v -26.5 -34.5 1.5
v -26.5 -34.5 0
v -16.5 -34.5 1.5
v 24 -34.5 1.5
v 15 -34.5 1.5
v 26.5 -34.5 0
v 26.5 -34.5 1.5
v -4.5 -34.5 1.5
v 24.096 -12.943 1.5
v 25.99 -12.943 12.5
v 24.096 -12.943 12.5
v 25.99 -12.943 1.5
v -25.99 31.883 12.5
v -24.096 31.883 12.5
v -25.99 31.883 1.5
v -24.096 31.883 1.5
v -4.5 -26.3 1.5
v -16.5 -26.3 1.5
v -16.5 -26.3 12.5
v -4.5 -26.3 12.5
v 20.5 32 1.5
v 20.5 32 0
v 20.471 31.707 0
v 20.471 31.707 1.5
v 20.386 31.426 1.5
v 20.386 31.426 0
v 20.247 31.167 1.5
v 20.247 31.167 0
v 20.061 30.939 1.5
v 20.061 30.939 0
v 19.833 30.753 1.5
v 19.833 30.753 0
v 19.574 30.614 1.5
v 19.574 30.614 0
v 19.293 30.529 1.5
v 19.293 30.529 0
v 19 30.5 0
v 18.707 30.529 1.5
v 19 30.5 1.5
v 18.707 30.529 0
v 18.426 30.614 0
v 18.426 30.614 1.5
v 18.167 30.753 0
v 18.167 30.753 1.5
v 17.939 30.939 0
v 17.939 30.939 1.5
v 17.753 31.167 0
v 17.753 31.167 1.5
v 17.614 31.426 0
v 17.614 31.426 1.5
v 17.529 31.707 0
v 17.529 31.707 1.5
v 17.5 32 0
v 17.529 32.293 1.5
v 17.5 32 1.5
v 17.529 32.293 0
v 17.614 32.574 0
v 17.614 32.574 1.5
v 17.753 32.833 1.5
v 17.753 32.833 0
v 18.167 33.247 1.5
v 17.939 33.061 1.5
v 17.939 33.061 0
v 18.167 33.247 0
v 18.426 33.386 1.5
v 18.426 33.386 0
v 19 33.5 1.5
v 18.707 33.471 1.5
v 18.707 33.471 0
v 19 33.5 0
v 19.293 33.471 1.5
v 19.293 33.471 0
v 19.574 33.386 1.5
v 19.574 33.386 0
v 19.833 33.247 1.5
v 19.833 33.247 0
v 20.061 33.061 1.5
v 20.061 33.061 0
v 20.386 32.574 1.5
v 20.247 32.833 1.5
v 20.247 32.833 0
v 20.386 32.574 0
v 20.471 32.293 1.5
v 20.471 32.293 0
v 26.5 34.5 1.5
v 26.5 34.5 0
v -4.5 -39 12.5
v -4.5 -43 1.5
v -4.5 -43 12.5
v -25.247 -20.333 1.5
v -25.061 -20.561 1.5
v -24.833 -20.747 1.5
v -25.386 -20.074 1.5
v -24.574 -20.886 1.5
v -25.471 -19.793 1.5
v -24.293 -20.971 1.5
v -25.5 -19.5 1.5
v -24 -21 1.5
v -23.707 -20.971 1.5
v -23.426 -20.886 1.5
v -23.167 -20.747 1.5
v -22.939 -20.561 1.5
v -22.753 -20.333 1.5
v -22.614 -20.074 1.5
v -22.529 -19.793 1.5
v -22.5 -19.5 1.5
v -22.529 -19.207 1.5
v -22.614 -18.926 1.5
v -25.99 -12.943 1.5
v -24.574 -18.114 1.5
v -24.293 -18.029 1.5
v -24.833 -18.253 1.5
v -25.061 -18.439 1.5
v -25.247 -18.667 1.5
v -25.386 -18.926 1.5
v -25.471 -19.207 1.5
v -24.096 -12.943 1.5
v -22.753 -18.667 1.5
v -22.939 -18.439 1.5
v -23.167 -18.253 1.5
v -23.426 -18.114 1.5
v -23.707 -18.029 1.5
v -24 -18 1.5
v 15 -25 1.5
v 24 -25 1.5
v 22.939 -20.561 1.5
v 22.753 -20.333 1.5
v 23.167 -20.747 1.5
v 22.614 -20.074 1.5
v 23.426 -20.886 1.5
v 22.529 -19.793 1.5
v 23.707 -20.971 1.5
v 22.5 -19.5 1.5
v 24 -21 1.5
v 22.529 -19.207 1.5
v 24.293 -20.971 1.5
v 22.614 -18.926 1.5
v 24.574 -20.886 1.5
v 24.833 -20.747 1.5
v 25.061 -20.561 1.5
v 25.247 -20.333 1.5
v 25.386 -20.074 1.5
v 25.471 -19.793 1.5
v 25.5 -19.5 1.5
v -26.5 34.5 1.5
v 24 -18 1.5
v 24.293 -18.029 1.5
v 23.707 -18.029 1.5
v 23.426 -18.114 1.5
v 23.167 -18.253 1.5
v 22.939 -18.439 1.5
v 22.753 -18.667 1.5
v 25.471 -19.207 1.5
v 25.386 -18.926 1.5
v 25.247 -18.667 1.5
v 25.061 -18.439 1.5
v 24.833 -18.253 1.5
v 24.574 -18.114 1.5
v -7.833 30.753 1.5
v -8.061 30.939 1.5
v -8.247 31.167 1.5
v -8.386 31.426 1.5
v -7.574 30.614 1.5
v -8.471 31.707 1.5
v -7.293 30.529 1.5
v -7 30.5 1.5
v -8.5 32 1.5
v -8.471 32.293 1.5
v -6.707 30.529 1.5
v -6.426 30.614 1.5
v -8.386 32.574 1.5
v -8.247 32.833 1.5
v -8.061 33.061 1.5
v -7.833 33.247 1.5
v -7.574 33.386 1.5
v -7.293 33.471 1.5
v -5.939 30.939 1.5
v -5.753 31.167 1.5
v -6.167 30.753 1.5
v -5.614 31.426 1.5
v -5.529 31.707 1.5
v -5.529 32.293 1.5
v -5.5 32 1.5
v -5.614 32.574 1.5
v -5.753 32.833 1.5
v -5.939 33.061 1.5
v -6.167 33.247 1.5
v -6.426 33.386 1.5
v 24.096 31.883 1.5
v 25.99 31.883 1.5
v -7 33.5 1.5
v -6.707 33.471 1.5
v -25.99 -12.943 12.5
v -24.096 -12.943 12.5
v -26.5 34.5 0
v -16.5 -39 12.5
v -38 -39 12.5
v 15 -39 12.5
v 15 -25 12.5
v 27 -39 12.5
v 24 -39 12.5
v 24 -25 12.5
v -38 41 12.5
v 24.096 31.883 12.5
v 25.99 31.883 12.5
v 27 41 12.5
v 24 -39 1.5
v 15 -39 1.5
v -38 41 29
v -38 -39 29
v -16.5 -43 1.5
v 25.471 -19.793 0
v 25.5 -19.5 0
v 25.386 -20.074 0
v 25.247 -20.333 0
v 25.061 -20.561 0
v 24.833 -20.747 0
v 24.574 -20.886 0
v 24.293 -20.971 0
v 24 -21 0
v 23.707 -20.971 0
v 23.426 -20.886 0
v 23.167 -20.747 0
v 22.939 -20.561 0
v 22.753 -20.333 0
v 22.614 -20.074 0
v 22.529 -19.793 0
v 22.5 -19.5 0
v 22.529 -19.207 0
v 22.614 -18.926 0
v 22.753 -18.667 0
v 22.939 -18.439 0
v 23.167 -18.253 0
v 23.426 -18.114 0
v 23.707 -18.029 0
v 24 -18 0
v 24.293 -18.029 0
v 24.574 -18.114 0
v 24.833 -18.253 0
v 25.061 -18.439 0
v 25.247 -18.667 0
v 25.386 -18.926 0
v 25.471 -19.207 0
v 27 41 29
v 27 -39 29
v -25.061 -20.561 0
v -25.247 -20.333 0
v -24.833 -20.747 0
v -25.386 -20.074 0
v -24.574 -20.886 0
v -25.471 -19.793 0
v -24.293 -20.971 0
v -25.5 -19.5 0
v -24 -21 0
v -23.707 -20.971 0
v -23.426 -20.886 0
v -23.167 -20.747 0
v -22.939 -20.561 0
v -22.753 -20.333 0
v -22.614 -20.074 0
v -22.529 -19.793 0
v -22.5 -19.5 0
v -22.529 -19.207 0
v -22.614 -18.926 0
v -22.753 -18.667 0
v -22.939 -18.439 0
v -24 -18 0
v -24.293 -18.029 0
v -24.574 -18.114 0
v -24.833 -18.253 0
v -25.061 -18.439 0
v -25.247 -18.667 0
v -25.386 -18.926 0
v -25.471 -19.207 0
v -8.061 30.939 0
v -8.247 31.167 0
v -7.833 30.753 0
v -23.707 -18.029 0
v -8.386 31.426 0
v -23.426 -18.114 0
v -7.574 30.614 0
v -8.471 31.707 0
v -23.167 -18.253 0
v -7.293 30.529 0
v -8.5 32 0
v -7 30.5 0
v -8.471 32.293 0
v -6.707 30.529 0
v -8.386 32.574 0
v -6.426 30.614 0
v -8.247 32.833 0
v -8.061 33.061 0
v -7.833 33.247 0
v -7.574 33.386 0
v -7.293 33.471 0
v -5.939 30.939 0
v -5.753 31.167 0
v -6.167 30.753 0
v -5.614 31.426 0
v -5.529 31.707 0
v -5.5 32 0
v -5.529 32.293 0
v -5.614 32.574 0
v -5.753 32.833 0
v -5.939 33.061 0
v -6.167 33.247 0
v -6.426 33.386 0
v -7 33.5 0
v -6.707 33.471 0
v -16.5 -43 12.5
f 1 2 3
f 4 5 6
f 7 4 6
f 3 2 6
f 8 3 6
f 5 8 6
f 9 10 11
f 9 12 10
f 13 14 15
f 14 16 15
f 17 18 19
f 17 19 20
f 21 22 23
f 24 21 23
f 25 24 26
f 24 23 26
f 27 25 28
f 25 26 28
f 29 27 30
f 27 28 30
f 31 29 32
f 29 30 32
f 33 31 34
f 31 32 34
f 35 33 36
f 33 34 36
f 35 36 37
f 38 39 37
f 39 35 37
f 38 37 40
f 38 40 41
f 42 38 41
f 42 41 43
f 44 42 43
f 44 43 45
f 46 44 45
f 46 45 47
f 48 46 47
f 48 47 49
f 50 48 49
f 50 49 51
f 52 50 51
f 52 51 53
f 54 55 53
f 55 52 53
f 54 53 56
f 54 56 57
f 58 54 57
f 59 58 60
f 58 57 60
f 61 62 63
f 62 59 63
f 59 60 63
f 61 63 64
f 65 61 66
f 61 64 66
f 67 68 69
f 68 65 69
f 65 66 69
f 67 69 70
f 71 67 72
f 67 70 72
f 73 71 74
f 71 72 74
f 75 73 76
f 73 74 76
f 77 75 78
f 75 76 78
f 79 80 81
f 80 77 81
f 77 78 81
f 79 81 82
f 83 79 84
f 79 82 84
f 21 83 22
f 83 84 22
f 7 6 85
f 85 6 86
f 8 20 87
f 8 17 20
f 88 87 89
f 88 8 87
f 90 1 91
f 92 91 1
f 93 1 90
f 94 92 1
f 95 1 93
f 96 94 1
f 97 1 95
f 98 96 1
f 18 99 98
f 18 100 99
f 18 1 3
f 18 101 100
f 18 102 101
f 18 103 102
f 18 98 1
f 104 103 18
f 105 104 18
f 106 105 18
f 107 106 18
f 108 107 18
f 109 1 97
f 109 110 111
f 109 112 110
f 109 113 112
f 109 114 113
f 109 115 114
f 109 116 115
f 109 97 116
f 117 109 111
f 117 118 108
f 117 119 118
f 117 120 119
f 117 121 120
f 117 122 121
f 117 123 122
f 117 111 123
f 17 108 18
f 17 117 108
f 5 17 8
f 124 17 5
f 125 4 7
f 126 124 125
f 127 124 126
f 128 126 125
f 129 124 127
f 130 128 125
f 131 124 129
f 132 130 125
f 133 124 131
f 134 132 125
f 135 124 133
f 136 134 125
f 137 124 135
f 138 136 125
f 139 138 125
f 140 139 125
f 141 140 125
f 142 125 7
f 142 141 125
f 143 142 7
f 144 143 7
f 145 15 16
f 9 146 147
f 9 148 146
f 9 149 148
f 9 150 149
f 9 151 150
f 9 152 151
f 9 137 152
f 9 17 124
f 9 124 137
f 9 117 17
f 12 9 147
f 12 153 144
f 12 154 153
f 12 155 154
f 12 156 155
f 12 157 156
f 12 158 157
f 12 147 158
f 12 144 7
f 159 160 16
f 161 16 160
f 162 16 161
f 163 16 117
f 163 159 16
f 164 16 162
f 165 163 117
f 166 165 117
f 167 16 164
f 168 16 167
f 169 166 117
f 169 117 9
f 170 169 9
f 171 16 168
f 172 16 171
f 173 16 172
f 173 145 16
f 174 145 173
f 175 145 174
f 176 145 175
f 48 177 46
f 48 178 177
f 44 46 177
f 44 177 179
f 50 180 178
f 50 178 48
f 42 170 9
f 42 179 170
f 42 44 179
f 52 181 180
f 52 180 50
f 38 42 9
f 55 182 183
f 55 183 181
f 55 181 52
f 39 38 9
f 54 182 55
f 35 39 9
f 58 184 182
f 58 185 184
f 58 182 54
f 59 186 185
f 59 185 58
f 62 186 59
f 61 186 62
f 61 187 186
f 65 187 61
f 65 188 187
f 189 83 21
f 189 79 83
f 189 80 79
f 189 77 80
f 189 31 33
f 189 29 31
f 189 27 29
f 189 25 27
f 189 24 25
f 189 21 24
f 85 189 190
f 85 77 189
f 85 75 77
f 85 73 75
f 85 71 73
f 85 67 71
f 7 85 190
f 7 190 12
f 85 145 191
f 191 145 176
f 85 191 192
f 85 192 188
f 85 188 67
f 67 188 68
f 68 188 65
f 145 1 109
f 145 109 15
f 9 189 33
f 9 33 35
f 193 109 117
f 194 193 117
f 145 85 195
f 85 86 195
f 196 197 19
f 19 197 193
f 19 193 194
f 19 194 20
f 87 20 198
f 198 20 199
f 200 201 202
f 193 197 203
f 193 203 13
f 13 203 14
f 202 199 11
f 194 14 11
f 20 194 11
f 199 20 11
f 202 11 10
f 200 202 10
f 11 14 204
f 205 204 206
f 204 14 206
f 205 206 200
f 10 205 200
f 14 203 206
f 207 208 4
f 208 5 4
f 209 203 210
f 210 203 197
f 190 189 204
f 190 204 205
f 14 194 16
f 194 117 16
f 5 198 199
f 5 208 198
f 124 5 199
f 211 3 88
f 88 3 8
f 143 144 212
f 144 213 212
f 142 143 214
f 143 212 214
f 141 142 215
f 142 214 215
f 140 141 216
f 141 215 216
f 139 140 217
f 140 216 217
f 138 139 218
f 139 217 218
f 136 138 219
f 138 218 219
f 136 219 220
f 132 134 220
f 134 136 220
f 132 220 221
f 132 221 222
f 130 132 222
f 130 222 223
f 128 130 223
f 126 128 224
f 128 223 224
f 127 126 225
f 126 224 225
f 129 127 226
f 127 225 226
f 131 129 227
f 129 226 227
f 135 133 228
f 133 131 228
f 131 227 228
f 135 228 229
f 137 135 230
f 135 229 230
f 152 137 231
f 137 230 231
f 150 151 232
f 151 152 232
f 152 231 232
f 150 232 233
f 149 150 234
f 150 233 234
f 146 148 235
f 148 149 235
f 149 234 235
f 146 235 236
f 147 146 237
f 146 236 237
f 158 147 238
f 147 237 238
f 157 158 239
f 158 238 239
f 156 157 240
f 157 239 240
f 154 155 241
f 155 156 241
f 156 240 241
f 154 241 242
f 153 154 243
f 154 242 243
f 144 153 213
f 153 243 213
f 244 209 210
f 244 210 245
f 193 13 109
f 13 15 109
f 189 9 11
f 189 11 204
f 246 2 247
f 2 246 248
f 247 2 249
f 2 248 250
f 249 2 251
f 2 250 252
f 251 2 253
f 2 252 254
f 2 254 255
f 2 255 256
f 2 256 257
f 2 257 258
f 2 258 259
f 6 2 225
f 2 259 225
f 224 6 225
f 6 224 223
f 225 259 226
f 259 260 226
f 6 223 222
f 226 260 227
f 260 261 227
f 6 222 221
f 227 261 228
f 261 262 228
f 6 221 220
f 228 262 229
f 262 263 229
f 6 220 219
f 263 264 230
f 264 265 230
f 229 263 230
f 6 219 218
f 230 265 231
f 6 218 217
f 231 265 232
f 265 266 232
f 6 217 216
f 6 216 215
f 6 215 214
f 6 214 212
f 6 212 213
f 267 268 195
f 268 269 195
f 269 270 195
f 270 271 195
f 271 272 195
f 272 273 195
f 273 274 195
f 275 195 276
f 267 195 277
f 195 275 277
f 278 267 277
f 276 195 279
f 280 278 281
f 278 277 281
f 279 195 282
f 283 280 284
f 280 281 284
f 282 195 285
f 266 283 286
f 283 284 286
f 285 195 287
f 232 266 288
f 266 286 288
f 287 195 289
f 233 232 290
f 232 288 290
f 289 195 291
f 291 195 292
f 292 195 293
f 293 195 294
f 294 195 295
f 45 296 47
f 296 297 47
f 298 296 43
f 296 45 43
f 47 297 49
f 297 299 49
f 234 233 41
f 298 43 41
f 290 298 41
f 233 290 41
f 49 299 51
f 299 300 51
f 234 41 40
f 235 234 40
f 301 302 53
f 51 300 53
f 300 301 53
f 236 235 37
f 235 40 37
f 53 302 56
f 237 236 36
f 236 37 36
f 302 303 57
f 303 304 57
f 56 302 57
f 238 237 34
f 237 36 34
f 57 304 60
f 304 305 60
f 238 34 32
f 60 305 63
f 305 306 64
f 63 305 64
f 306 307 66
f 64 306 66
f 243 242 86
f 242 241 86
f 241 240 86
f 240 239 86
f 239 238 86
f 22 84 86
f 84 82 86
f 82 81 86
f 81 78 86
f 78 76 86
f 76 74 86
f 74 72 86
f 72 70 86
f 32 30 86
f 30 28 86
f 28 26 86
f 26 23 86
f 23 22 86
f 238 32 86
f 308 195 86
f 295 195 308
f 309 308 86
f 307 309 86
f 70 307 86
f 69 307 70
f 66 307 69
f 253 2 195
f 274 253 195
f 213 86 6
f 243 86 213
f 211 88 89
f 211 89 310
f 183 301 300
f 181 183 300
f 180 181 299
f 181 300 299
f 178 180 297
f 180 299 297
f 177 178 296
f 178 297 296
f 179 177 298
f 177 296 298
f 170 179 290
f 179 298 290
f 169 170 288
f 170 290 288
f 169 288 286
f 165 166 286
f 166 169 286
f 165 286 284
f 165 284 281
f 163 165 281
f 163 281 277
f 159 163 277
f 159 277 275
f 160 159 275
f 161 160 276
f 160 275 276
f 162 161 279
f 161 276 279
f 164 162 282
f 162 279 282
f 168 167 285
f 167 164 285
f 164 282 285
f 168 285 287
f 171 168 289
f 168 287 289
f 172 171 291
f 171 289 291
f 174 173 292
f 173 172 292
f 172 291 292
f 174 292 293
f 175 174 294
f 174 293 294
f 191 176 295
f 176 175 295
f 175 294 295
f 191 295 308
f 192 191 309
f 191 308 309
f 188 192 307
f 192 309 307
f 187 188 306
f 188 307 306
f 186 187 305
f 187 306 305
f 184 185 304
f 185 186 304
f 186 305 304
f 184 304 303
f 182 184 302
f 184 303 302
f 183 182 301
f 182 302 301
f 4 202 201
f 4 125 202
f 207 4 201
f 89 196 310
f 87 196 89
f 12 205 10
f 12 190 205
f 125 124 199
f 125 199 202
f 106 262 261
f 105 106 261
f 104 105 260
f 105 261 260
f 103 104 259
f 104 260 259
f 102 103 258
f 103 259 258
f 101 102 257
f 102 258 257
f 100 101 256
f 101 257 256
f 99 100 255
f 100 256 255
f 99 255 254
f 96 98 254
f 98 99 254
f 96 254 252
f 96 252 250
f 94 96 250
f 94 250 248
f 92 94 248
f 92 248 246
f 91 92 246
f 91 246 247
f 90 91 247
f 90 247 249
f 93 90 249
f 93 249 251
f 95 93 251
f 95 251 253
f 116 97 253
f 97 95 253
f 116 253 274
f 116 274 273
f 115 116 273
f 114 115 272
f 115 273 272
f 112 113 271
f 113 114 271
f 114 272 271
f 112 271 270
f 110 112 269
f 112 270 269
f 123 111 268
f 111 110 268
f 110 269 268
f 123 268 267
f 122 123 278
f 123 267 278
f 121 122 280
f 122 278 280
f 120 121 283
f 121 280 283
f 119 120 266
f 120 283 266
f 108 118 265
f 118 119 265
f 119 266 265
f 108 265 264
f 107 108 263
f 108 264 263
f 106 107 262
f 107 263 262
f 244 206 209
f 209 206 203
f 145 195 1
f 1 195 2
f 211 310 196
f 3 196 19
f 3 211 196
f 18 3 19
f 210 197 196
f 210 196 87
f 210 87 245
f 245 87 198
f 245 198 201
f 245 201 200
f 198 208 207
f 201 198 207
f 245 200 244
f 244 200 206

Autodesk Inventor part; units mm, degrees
ref_plane "YZ Plane" through (0, 0, 0) normal (1, 0, 0) x (0, 1, 0)
ref_plane "XZ Plane" through (0, 0, 0) normal (0, 1, 0) x (-1, 0, 0)
ref_plane "XY Plane" through (0, 0, 0) normal (0, 0, 1) x (1, 0, 0)
sketch "스케치2" plane through (0, 0, 0) normal (0, 0, 1) x (1, 0, 0)
  line L0 (-26.5, -34.5) -> (26.5, -34.5)
  line L1 (26.5, -34.5) -> (26.5, 34.5)
  line L2 (26.5, 34.5) -> (-26.5, 34.5)
  line L3 (-26.5, 34.5) -> (-26.5, -34.5)
  line L4 (-26.5, -34.5) -> (26.5, 34.5) construction
  line L5 (26.5, -34.5) -> (-26.5, 34.5) construction
  circle A0 centre (19, 32) radius 1.5
  circle A1 centre (-7, 32) radius 1.5
  circle A2 centre (24, -19.5) radius 1.5
  circle A3 centre (-24, -19.5) radius 1.5
  point P0 (0, 0)
  dimension "d0" = 53
  dimension "d1" = 69
  dimension "d2" = 3
  dimension "d3" = 3
  dimension "d4" = 2.5
  dimension "d5" = 2.5
  dimension "d6" = 7.5
  dimension "d8" = 26
  dimension "d9" = 3
  dimension "d10" = 3
  dimension "d11" = 2.5
  dimension "d12" = 2.5
  dimension "d13" = 15
extrude "돌출1" add sketch "스케치2" along normal blind 1.5
sketch "스케치3" plane through (0, 0, 1.5) normal (0, 0, 1) x (1, 0, 0)
  line L0 (-16.5, -26.3) -> (-4.5, -26.3)
  line L1 (-4.5, -26.3) -> (-4.5, -43)
  line L2 (-4.5, -43) -> (-16.5, -43)
  line L3 (-16.5, -43) -> (-16.5, -26.3)
  line L4 (-16.5, -26.3) -> (-4.5, -43) construction
  line L5 (-4.5, -26.3) -> (-16.5, -43) construction
  line L6 (15, -25) -> (24, -25)
  line L7 (24, -25) -> (24, -39)
  line L8 (24, -39) -> (15, -39)
  line L9 (15, -39) -> (15, -25)
  line L10 (15, -25) -> (24, -39) construction
  line L11 (24, -25) -> (15, -39) construction
  line L12 (-26.5, -34.5) -> (26.5, -34.5) projected
  line L13 (26.5, -34.5) -> (26.5, 34.5) projected
  line L14 (-26.5, 34.5) -> (-26.5, -34.5) projected
  point P0 (0, 0)
  point P1 (-10.5, -34.65)
  point P2 (19.5, -32)
  dimension "d16" = 12
  dimension "d17" = 16.7
  dimension "d18" = 9
  dimension "d19" = 14
  dimension "d20" = 4.5
  dimension "d21" = 2.5
  dimension "d22" = 8.5
  dimension "d23" = 10
extrude "돌출2" add sketch "스케치3" along normal blind 11 contours L0 L1 L12 L3 | L12 L1 L2 L3
extrude "돌출3" add sketch "스케치3" along normal blind 11 contours L9 L6 L7 L12 | L12 L7 L8 L9
sketch "스케치4" plane through (0, 0, 1.5) normal (0, 0, 1) x (1, 0, 0)
  line L0 (-25.9905, -12.9426) -> (-24.0965, -12.9426)
  line L1 (-24.0965, -12.9426) -> (-24.0965, 31.8831)
  line L2 (-24.0965, 31.8831) -> (-25.9905, 31.8831)
  line L3 (-25.9905, 31.8831) -> (-25.9905, -12.9426)
  line L4 (-25.9905, -12.9426) -> (-24.0965, 31.8831) construction
  line L5 (-24.0965, -12.9426) -> (-25.9905, 31.8831) construction
  line L6 (0, 0) -> (0, 9.4702)
  line L7 (25.9905, -12.9426) -> (24.0965, -12.9426)
  line L8 (24.0965, -12.9426) -> (24.0965, 31.8831)
  line L9 (24.0965, 31.8831) -> (25.9905, 31.8831)
  line L10 (25.9905, 31.8831) -> (25.9905, -12.9426)
  line L11 (25.9905, -12.9426) -> (24.0965, 31.8831) construction
  line L12 (24.0965, -12.9426) -> (25.9905, 31.8831) construction
  point P0 (-25.0435, 9.4702)
  point P1 (25.0435, 9.4702)
extrude "돌출4" add sketch "스케치4" along normal blind 11
sketch "스케치5" plane through (0, 0, 12.5) normal (0, 0, 1) x (1, 0, 0)
  line L0 (-38, -39) -> (27, -39)
  line L1 (27, -39) -> (27, 41)
  line L2 (27, 41) -> (-38, 41)
  line L3 (-38, 41) -> (-38, -39)
  line L4 (-38, -39) -> (27, 41) construction
  line L5 (27, -39) -> (-38, 41) construction
  line L6 (26.5, -34.5) -> (26.5, 34.5) projected
  point P0 (0, 0)
  point P1 (-5.5, 1)
  point P2 (-38, 34.5)
  point P3 (24, -39)
  dimension "d30" = 80
  dimension "d31" = 65
  dimension "d34" = 0.5
extrude "돌출5" add sketch "스케치5" along normal blind 16.5
properties part number "스피커"
